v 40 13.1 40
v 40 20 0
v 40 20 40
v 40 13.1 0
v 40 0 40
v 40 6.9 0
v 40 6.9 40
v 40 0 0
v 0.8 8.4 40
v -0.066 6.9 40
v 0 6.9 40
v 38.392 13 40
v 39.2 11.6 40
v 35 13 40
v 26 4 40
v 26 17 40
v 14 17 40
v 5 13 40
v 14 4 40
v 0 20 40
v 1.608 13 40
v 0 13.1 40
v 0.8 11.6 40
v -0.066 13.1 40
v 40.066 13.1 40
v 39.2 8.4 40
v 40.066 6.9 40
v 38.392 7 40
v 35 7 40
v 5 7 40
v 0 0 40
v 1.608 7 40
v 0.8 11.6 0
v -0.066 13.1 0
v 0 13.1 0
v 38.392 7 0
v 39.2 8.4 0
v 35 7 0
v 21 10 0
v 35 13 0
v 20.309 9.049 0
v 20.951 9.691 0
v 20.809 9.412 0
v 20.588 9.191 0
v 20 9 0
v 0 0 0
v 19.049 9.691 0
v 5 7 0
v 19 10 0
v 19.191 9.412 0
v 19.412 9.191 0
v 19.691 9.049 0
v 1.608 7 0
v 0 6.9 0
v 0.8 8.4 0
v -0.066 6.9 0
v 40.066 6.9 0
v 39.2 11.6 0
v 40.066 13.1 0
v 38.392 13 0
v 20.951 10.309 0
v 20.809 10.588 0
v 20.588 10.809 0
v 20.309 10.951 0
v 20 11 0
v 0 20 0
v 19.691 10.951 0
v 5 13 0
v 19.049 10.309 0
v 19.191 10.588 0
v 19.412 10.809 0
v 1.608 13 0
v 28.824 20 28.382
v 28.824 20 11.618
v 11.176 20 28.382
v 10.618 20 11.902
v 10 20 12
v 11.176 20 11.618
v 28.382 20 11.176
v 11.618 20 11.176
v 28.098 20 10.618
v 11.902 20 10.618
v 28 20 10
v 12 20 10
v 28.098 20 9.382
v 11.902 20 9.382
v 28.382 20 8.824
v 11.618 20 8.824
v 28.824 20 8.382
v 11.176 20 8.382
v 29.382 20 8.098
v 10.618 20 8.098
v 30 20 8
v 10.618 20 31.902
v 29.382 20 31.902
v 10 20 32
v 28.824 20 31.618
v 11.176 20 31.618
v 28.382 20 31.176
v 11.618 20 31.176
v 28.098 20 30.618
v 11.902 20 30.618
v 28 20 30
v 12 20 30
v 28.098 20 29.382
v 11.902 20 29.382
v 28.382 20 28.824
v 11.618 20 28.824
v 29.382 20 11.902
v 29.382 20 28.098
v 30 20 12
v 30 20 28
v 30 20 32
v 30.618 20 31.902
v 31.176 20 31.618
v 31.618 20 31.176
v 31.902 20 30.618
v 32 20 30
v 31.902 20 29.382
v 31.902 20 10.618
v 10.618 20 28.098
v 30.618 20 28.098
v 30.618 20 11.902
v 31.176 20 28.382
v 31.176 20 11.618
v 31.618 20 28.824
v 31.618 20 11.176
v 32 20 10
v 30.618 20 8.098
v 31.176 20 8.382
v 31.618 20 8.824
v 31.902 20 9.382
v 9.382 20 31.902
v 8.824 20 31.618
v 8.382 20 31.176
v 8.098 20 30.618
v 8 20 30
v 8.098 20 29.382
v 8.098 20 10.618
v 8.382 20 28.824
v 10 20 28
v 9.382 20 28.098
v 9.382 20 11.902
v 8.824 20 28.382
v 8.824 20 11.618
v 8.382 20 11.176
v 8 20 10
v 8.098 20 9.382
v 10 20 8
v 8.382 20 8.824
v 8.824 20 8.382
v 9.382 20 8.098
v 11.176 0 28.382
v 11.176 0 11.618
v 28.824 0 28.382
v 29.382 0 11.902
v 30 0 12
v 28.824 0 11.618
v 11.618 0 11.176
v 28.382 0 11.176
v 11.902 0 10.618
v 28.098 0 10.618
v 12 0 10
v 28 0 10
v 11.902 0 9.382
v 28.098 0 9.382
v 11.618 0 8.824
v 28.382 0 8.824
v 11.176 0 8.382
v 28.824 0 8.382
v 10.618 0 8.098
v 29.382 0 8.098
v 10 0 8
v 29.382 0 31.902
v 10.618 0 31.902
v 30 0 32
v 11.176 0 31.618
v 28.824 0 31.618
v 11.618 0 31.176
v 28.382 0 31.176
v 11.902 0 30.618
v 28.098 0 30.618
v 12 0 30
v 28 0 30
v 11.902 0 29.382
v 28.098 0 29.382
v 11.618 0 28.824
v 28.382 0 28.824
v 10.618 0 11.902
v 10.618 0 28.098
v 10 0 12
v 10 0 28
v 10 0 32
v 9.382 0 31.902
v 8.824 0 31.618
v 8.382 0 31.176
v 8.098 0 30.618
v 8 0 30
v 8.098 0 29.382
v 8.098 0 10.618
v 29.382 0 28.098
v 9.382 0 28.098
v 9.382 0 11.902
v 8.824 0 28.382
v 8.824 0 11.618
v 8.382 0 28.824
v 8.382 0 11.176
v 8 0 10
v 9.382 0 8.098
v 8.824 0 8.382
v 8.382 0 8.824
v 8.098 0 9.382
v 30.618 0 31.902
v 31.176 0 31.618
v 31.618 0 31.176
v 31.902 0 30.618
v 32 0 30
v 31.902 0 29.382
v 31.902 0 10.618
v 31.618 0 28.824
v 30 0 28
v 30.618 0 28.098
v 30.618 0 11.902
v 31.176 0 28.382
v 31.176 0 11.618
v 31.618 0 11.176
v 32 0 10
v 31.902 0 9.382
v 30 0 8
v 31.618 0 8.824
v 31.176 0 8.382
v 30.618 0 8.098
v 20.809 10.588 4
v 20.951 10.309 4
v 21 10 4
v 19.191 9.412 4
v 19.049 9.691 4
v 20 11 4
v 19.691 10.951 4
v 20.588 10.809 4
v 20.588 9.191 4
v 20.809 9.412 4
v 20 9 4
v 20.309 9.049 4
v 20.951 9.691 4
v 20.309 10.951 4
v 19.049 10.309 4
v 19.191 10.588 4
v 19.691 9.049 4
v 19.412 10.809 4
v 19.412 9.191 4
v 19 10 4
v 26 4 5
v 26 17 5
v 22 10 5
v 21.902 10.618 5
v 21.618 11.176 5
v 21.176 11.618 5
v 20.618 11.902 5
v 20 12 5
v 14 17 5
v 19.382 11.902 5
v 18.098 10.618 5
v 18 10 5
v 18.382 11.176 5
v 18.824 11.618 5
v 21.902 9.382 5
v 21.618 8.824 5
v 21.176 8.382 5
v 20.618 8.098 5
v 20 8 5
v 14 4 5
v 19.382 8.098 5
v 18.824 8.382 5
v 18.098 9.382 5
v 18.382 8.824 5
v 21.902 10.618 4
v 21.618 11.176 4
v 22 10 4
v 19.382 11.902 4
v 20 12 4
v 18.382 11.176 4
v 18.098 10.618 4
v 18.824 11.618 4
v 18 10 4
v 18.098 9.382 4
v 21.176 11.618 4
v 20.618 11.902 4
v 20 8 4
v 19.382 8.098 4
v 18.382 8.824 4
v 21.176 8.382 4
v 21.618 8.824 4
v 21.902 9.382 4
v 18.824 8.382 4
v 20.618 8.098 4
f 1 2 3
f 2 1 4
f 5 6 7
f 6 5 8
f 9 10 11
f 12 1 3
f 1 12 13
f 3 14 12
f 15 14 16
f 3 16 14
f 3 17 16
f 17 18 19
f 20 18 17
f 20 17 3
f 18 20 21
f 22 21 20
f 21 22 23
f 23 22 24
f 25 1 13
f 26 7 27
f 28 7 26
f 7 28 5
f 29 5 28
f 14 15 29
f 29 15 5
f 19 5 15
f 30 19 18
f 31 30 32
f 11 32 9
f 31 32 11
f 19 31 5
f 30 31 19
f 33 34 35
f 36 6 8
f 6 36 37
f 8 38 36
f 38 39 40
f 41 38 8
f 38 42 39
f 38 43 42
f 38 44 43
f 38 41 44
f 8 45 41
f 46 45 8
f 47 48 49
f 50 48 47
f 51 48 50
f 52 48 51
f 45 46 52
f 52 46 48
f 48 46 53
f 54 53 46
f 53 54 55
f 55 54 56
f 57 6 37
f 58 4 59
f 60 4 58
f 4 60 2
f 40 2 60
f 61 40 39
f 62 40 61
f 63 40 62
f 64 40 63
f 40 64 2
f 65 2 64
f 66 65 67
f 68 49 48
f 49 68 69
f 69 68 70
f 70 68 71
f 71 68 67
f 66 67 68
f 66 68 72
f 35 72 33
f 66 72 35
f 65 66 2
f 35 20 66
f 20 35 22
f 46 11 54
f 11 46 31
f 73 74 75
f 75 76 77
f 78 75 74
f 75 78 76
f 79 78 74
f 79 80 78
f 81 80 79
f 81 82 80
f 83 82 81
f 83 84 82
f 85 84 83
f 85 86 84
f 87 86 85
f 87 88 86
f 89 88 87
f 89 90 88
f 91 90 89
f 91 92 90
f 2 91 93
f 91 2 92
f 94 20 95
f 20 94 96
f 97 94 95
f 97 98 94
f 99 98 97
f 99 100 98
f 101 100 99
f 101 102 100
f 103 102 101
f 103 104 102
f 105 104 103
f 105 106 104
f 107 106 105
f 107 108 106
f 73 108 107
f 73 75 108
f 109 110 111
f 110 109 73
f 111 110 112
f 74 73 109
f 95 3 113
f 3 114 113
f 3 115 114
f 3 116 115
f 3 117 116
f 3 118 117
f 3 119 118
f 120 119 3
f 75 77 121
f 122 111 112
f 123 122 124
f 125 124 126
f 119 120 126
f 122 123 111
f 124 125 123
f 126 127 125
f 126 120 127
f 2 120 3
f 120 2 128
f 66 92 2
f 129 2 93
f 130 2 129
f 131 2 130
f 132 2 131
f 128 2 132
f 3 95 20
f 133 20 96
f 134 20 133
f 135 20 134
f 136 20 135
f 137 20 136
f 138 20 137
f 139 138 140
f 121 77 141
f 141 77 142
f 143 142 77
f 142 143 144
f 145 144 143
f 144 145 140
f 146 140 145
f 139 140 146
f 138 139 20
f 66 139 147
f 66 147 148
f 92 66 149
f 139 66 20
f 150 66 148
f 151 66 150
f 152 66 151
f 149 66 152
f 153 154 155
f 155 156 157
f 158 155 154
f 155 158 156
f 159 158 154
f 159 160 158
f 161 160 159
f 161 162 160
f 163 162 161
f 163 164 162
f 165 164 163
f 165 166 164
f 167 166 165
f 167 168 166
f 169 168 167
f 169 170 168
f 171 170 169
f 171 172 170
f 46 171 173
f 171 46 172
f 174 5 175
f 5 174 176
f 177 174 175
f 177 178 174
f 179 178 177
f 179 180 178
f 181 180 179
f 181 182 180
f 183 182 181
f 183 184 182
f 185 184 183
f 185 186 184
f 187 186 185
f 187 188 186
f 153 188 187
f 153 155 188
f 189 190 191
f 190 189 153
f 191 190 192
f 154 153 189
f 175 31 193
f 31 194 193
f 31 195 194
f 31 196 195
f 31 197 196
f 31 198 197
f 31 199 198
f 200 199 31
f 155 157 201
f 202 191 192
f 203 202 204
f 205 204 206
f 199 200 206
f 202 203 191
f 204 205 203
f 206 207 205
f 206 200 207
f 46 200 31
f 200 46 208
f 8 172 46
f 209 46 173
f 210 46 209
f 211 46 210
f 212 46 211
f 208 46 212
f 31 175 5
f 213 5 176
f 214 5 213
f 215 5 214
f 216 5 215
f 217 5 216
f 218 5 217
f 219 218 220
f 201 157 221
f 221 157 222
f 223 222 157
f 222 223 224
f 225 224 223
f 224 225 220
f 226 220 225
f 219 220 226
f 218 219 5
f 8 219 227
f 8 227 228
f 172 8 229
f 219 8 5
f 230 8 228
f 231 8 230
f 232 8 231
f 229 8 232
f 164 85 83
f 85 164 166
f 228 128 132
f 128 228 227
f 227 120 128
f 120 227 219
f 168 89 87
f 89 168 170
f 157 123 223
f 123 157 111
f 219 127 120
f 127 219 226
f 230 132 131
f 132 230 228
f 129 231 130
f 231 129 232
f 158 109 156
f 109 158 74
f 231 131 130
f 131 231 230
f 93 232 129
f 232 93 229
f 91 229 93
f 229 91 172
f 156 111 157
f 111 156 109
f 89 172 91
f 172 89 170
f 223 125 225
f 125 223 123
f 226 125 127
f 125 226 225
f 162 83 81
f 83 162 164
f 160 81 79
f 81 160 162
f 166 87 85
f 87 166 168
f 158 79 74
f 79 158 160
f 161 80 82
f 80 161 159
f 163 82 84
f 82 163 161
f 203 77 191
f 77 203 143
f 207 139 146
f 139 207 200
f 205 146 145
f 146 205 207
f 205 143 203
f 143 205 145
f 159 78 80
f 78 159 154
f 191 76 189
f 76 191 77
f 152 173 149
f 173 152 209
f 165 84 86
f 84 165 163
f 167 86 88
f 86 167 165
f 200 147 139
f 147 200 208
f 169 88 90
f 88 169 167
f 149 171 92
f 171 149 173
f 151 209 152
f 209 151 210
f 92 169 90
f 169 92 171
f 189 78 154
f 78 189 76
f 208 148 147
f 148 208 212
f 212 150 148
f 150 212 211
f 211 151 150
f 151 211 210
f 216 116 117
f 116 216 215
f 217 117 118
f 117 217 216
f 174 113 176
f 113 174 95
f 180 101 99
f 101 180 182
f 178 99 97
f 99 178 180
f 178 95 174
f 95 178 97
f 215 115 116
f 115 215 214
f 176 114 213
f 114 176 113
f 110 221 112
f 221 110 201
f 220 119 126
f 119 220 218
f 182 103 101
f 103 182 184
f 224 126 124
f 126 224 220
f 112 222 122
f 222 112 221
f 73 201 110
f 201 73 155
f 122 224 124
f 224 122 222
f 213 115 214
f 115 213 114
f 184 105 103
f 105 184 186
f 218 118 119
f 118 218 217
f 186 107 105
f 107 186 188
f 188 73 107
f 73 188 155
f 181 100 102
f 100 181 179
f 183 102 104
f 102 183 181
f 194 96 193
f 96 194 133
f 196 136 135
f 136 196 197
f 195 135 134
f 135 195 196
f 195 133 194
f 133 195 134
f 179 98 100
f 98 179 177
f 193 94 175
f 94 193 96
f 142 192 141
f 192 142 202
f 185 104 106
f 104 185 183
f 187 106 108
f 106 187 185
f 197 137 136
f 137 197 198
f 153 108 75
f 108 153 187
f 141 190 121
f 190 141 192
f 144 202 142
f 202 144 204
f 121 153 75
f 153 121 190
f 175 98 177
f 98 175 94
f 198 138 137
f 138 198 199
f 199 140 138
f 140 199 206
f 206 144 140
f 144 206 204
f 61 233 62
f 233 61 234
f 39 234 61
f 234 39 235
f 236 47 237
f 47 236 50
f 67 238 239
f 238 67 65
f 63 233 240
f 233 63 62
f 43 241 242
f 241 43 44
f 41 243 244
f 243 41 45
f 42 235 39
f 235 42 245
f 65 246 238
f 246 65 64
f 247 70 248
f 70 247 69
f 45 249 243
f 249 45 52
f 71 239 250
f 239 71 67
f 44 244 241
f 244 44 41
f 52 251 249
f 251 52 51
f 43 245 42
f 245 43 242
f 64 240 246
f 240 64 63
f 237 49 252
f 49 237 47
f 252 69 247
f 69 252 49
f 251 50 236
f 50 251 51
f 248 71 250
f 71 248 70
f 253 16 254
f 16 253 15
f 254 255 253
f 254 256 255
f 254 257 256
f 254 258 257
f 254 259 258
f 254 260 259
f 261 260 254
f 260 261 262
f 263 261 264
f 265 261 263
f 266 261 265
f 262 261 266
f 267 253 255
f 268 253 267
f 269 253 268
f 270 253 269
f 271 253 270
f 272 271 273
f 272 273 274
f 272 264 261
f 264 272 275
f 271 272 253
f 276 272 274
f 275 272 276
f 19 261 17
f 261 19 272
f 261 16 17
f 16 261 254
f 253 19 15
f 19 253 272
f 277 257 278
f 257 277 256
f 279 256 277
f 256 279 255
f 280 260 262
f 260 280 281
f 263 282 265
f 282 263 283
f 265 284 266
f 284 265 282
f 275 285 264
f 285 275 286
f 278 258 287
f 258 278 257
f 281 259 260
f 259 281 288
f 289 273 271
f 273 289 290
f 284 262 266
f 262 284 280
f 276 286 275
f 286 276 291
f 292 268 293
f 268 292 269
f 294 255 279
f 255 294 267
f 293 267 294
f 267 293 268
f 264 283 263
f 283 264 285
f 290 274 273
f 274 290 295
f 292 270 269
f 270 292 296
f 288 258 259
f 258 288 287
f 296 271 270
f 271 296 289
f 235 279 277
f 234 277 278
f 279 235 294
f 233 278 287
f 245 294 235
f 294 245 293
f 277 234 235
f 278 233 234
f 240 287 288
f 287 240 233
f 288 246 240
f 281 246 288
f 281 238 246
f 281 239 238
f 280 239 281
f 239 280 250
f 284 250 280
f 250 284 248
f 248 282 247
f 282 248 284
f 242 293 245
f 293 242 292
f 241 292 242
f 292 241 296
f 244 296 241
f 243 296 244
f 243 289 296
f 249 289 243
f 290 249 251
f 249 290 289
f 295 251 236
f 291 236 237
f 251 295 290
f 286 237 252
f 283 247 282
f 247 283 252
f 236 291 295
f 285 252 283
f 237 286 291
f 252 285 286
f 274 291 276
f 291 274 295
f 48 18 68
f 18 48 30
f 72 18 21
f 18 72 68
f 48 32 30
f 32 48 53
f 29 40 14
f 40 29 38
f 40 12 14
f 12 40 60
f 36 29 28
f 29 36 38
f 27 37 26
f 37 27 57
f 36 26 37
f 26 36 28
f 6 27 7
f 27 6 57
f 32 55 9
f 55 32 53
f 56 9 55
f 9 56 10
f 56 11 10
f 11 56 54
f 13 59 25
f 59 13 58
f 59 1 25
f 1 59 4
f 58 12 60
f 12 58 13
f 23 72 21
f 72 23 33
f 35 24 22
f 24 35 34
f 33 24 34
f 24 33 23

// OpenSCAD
// Eduardo Blanco Bielsa - UO285176
module cuerpo(alto,ancho,largo, anchoagujero, radioagujero, offsetAgujero, offsetTriangulos, radioTriangulos){
    difference(){
        cube([alto,ancho,largo]);
        
        //Agujeros
        rotate([90, 0, 0])
            translate([30,10,-20])
                        cylinder(h = anchoagujero, r = radioagujero, $fn=offsetAgujero);
        rotate([90, 0, 0])
            translate([10,10,-20])
                        cylinder(h = anchoagujero, r = radioagujero, $fn=offsetAgujero);
        rotate([90, 0, 0])
            translate([30,30,-20])
                        cylinder(h = anchoagujero, r = radioagujero, $fn=offsetAgujero);
        rotate([90, 0, 0])
            translate([10,30,-20])
                        cylinder(h = anchoagujero, r = radioagujero, $fn=offsetAgujero);
        //Agujero de debajo
        translate([20,10,0])
                        cylinder(h = anchoagujero, r = 1, $fn=offsetAgujero);
        //Cubo agujero
        translate([14,4,5]){
            cube([alto/2 -8,ancho-7,largo]);
        }
        //Pequeño reborde interior cilindrico
        translate([20,10,4])
               cylinder(h = anchoagujero, r = radioagujero, $fn=offsetAgujero);
        //Bifurcaciones rectangulares de los laterales
        translate([0,7,0]){
            cube([5,6,largo]);
        }
        translate([35,7,0]){
            cube([5,6,largo]);
        }
    }
    //Bifurcaciones triangulares exteriores
        rotate([0,0,90])
            translate([7.4,-39.2,0])
                cylinder (h = largo, r= radioTriangulos, $fn=offsetTriangulos);
        rotate([0,0,90])
            translate([7.4,-0.8,0])
                cylinder (h = largo, r= radioTriangulos, $fn=offsetTriangulos);
        rotate([0,0,-90])
            translate([-12.6,39.2,0])
                cylinder (h = largo, r= radioTriangulos, $fn=offsetTriangulos);
        rotate([0,0,-90])
            translate([-12.6,0.8,0])
                cylinder (h = largo, r= radioTriangulos, $fn=offsetTriangulos);
        
}

cuerpo(40,20,40, 40,2, 20, 3, 1);
